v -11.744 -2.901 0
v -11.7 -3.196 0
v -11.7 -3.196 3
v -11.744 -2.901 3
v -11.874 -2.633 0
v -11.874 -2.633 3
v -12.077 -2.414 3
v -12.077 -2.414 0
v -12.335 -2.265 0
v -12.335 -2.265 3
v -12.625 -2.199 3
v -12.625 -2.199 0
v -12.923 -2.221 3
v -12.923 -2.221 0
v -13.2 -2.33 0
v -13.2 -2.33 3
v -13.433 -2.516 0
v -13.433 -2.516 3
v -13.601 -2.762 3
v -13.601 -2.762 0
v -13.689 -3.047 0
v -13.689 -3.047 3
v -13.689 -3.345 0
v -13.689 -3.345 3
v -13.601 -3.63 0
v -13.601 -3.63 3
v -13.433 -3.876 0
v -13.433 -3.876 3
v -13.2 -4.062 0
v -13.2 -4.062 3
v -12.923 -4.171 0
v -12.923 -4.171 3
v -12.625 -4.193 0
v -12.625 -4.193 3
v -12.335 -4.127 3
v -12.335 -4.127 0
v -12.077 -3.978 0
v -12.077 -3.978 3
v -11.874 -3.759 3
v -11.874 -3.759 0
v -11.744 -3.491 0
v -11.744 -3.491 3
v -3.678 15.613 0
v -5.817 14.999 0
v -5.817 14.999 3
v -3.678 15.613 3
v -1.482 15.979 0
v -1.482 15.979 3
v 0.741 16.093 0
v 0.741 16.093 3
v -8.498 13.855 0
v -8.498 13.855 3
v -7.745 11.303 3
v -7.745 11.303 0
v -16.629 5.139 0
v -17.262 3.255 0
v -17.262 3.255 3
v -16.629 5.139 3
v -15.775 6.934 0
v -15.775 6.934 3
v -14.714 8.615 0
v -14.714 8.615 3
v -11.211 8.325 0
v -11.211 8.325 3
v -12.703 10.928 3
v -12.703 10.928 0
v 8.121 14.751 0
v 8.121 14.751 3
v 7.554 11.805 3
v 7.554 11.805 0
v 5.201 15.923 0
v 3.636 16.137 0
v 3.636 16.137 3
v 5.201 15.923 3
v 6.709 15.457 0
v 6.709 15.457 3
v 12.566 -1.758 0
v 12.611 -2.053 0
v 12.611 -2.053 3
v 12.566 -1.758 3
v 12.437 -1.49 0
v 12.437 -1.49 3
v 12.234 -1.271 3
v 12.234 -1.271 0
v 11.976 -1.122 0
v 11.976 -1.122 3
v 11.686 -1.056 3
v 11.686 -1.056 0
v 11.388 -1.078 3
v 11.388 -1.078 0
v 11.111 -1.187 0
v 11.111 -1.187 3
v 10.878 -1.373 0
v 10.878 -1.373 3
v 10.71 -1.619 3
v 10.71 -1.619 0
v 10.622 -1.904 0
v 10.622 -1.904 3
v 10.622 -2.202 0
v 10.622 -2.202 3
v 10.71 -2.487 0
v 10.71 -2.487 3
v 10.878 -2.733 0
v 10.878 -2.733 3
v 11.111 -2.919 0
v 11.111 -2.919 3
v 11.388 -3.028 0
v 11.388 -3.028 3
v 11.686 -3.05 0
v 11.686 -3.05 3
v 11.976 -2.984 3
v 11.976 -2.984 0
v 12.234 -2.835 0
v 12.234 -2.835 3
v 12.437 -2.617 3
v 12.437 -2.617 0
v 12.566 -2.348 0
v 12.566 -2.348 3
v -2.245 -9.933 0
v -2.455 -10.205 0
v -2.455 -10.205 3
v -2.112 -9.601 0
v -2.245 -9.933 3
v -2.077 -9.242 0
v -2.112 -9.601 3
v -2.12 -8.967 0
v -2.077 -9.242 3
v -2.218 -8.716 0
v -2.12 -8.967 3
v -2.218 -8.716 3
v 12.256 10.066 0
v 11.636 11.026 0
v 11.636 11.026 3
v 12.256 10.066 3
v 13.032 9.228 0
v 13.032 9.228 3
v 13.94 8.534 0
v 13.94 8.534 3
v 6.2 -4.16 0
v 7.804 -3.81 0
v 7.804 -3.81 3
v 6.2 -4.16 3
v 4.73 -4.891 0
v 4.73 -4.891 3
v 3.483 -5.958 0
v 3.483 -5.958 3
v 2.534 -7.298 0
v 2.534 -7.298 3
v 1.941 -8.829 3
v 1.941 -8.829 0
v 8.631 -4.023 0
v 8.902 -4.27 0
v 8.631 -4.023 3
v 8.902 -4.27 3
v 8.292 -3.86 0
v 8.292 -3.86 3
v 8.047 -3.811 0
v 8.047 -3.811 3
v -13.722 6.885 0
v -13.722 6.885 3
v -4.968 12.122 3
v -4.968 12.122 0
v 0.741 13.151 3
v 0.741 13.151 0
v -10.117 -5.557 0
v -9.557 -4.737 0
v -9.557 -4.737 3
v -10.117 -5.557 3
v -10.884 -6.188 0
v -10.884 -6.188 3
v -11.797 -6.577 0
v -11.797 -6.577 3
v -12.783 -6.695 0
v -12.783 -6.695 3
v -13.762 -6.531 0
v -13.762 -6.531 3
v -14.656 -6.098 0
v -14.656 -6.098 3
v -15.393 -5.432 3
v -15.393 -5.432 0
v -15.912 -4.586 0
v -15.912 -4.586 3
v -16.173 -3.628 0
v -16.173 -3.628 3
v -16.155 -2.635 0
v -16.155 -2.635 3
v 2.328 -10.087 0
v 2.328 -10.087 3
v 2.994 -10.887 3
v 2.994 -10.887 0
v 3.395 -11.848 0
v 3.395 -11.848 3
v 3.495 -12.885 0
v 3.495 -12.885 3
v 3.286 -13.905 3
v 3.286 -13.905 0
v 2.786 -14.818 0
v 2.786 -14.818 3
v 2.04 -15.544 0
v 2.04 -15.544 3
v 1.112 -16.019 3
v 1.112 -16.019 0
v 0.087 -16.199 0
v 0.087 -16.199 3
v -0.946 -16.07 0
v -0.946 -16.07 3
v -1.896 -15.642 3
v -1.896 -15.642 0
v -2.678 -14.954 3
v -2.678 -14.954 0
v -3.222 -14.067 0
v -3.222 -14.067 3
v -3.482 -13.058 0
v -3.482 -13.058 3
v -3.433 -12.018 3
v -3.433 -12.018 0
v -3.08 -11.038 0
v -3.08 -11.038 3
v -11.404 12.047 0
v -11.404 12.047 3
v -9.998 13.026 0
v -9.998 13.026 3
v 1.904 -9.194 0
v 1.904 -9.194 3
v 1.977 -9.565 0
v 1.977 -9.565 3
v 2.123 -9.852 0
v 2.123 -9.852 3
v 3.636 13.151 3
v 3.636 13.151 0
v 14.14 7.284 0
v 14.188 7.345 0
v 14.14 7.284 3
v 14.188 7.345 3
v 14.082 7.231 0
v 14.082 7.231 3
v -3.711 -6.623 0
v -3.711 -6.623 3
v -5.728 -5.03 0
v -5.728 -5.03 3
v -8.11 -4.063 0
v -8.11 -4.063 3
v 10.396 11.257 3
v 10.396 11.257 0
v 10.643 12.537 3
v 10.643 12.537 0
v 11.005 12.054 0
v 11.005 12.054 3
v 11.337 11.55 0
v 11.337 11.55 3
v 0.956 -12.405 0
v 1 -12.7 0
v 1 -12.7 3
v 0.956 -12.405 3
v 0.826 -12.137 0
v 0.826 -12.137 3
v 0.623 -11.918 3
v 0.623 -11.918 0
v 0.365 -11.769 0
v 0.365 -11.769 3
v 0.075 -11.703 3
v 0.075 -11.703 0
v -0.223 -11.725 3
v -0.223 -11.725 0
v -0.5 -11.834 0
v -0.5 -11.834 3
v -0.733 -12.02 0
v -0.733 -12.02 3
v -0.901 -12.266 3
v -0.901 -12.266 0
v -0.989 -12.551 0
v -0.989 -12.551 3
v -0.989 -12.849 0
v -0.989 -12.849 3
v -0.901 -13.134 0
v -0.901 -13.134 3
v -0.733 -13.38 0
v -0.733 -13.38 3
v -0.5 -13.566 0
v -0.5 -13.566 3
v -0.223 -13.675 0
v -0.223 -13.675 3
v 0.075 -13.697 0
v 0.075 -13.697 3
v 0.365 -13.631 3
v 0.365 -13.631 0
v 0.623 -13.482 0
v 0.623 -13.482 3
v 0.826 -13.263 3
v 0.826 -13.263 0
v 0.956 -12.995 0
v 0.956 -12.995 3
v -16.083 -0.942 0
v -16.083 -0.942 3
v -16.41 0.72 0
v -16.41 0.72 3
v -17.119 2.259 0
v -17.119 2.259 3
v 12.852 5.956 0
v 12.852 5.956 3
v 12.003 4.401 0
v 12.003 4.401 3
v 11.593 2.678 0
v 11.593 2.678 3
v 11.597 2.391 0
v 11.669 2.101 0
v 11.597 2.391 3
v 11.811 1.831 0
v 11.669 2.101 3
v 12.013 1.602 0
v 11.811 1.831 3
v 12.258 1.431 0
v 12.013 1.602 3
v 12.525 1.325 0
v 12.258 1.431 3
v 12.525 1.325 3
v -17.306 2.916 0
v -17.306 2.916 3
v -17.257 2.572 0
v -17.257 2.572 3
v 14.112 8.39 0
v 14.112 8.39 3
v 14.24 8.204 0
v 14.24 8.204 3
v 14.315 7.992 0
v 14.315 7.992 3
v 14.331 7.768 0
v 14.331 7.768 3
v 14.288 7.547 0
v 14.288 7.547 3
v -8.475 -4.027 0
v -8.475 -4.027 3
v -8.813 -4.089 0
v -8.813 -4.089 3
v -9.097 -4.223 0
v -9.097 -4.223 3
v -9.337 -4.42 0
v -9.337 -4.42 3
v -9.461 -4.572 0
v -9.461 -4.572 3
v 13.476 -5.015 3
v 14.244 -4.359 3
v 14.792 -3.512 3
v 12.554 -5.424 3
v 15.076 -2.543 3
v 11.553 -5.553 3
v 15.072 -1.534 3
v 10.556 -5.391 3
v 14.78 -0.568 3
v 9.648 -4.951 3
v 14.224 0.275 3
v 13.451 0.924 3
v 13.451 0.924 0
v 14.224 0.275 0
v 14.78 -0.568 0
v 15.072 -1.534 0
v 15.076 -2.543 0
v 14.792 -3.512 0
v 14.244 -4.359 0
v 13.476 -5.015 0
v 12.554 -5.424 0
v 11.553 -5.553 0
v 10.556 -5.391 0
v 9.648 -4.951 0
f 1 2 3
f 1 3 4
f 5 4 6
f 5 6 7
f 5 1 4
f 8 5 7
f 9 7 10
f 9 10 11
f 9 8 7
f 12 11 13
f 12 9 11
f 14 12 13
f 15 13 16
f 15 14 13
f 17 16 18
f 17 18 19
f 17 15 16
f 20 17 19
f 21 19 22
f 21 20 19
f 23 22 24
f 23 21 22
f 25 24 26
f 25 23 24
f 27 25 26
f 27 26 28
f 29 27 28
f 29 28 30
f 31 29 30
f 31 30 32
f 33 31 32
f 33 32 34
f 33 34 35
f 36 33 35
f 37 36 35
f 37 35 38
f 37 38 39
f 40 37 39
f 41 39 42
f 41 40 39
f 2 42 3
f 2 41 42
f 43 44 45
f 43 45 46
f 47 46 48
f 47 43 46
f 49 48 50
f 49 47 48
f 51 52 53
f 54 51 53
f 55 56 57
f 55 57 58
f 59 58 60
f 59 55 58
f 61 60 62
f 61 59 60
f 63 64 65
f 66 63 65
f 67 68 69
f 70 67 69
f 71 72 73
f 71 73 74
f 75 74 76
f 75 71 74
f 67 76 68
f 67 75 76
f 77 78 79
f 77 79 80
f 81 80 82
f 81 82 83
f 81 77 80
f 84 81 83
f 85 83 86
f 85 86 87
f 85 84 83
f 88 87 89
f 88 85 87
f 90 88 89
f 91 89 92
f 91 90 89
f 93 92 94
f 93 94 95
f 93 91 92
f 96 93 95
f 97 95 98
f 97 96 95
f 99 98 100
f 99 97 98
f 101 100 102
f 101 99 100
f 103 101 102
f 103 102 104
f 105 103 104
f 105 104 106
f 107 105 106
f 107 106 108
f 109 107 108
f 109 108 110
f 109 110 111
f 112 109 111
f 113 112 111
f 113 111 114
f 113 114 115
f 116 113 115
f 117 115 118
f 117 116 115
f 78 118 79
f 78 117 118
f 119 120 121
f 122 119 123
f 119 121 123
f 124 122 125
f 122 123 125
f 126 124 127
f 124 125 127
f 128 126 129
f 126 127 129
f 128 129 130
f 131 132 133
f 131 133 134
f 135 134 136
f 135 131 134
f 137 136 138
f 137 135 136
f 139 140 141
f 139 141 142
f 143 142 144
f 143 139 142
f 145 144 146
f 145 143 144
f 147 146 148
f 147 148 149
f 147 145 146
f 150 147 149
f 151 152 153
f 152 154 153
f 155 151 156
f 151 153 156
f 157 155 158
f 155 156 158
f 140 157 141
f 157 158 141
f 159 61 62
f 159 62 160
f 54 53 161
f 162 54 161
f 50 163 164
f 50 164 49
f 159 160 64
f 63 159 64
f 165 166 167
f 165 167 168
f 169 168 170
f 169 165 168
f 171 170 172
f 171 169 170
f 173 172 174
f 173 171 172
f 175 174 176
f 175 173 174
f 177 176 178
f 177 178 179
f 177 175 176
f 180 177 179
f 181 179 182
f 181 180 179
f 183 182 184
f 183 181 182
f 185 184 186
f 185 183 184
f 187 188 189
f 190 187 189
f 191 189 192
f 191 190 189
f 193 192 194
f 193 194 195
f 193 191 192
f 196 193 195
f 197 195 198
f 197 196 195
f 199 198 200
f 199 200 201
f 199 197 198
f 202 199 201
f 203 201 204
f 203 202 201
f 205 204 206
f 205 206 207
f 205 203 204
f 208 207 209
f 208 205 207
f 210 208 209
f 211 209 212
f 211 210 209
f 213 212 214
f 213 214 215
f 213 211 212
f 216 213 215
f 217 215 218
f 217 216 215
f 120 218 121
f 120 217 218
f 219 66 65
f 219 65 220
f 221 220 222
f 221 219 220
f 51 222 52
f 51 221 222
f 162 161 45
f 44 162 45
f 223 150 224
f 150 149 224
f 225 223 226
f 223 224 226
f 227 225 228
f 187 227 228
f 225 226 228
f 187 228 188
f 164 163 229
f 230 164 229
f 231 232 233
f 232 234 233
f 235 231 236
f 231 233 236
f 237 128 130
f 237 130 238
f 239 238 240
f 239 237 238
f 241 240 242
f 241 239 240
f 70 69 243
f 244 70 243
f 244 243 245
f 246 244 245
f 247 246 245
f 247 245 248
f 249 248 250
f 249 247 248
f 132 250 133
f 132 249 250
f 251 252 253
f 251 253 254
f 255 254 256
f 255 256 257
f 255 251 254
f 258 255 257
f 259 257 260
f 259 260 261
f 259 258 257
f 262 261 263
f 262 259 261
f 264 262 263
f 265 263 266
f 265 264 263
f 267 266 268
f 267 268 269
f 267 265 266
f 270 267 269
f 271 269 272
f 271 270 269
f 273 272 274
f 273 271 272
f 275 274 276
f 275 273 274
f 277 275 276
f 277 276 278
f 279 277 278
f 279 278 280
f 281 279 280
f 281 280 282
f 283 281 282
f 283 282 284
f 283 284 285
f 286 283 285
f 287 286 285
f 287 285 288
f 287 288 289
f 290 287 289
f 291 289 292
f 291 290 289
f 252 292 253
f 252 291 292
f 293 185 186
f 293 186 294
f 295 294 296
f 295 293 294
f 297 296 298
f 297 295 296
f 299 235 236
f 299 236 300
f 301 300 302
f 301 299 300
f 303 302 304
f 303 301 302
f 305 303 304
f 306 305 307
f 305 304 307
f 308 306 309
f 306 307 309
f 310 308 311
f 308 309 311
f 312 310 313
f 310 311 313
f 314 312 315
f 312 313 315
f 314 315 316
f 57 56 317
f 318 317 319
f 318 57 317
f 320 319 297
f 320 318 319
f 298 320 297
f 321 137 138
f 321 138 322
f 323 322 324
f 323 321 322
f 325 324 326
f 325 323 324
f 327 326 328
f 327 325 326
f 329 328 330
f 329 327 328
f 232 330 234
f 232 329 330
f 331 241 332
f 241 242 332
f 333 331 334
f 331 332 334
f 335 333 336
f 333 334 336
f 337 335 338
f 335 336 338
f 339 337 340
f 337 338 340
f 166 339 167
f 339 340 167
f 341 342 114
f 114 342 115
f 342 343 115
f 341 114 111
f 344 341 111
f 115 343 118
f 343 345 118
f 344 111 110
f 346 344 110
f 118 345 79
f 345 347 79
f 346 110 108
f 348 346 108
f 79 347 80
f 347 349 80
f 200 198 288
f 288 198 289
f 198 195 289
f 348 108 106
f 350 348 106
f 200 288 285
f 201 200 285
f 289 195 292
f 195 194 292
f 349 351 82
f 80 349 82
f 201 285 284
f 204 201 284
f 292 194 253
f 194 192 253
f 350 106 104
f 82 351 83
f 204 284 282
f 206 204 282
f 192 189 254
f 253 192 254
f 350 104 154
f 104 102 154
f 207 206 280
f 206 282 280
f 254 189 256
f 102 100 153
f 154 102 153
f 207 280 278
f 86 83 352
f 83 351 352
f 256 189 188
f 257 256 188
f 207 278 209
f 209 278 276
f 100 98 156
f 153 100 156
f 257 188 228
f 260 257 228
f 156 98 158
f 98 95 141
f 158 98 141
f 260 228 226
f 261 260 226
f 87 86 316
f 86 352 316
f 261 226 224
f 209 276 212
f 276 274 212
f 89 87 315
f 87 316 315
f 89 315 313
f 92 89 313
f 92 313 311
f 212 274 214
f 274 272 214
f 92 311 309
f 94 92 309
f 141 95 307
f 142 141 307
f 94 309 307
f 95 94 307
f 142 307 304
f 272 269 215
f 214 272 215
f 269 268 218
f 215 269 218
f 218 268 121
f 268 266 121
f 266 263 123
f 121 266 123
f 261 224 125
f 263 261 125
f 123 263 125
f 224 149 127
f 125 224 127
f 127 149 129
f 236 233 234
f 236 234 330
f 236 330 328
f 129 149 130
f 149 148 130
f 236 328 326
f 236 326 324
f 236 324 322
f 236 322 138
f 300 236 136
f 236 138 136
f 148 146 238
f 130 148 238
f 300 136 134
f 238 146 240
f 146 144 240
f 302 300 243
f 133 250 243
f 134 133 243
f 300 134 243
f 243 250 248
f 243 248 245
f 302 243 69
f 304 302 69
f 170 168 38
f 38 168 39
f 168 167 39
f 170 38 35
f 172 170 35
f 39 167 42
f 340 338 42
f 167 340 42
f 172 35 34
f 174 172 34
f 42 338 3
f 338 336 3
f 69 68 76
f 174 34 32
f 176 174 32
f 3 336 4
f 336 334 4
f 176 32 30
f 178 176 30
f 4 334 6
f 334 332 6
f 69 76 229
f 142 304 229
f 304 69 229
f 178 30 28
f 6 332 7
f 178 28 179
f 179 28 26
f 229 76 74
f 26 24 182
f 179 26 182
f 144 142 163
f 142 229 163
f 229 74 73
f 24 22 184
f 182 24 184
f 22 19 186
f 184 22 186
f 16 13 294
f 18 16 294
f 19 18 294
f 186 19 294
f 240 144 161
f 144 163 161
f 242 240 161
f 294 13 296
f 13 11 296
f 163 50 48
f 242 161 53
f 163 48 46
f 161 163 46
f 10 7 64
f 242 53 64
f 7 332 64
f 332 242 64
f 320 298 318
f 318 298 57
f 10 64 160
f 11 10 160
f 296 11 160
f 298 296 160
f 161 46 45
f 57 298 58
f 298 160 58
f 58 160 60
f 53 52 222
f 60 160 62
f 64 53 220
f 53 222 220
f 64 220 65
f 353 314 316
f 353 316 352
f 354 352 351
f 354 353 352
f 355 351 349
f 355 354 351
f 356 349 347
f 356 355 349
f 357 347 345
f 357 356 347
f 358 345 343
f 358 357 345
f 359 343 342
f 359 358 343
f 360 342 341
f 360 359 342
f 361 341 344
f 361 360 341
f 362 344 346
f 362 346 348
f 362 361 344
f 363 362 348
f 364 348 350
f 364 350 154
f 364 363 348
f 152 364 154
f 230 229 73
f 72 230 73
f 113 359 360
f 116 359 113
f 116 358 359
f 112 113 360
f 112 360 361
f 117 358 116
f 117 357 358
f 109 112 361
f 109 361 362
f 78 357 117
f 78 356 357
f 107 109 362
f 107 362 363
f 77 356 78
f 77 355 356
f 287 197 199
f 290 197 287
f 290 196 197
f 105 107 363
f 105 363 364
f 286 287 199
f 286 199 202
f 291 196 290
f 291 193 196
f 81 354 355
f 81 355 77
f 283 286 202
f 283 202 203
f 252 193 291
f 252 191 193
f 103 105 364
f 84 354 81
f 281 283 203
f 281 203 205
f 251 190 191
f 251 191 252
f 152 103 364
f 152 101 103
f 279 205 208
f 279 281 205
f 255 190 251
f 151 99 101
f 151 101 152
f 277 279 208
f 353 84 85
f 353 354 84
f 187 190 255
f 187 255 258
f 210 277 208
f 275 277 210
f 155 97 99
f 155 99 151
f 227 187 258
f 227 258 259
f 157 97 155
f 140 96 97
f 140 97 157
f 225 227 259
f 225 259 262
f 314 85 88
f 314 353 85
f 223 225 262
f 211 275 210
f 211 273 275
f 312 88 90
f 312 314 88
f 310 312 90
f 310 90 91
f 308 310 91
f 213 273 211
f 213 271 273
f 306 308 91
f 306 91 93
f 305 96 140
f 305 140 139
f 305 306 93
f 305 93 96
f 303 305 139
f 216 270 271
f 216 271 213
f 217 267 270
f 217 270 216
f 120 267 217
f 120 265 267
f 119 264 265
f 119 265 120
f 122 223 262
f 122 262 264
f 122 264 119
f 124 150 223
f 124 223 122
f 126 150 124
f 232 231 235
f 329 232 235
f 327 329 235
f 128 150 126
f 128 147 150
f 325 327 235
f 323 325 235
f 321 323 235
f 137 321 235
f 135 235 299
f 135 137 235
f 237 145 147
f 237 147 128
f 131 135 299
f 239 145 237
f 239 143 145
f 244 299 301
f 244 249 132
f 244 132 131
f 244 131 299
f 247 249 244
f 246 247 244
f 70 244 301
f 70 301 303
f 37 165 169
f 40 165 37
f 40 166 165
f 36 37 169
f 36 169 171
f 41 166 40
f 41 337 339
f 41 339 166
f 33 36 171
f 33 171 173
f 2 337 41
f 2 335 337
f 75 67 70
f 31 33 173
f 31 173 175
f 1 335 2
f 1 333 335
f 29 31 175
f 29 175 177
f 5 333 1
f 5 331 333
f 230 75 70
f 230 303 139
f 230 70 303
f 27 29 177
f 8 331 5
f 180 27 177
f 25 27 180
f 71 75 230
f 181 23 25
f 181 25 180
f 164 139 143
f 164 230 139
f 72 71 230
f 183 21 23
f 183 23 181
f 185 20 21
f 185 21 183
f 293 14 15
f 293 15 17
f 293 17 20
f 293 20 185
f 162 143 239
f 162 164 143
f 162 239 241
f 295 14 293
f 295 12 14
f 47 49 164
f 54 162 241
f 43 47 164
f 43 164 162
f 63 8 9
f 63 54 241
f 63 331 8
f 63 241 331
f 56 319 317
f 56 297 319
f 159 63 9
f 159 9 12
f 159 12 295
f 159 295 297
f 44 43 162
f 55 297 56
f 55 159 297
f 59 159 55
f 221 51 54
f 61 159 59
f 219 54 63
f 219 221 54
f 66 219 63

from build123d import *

# Parameters (mm, degrees)
SKETCH_1_R          = 1
EXTRUDE_1_DEPTH     = 3
FILLET_2_R          = 0.508
FILLET_3_R          = 1.27
SKETCH_3_W          = 2.895
SKETCH_3_H          = 3
CUT_EXTRUDE_1_DEPTH = 3


with BuildPart() as part:
    # 스케치1 → 보스-돌출1 (new body)
    with BuildSketch(Plane.XY):
        with BuildLine():
            ThreePointArc((-17.404694621, 2.689152768), (-14.003146094, 9.533383958), (-7.898975086, 14.132637079))
            ThreePointArc((-7.898975086, 14.132637079), (-3.181334345, 15.718511975), (1.784123639, 16.058159386))
            ThreePointArc((1.784123639, 16.058159386), (7.503730287, 15.09544823), (11.636286652, 11.025719632))
            ThreePointArc((11.636286652, 11.025719632), (12.626023912, 9.630255586), (13.939804575, 8.534408829))
            ThreePointArc((13.939804575, 8.534408829), (14.323714016, 7.94412001), (14.129144933, 7.267385039))
            ThreePointArc((14.129144933, 7.267385039), (12.117054941, 4.680354007), (11.583823092, 1.44664105))
            ThreePointArc((11.583823092, 1.44664105), (14.643044666, -3.801243579), (8.56860409, -3.783882772))
            ThreePointArc((8.56860409, -3.783882772), (4.032207962, -5.42180917), (1.784123639, -9.688870172))
            ThreePointArc((1.784123639, -9.688870172), (0, -16.2), (-1.784123639, -9.688870172))
            ThreePointArc((-1.784123639, -9.688870172), (-4.704806794, -5.722399103), (-9.262378909, -3.853758086))
            ThreePointArc((-9.262378909, -3.853758086), (-13.309581542, -6.642419158), (-16.154715264, -2.634714849))
            ThreePointArc((-16.154715264, -2.634714849), (-16.251667385, 0.151195755), (-17.404694621, 2.689152768))
        make_face()
        with Locations((-12.7, -3.195912181)):
            Circle(SKETCH_1_R, mode=Mode.SUBTRACT)
        with Locations((0, -12.7)):
            Circle(SKETCH_1_R, mode=Mode.SUBTRACT)
        with Locations((11.610795337, -2.05325502)):
            Circle(SKETCH_1_R, mode=Mode.SUBTRACT)
    extrude(amount=EXTRUDE_1_DEPTH)

    # 필렛2
    fillet_2_edges = [part.edges().sort_by_distance(p)[0] for p in [
        (14.129144933, 7.267385039, 1.5),
    ]]
    fillet(fillet_2_edges, radius=FILLET_2_R)

    # 필렛3
    fillet_3_edges = [part.edges().sort_by_distance(p)[0] for p in [
        (1.784123639, -9.688870172, 1.5),
        (-1.784123639, -9.688870172, 1.5),
        (-9.262378909, -3.853758086, 1.5),
        (-17.404694621, 2.689152768, 1.5),
        (11.583823092, 1.44664105, 1.5),
        (8.56860409, -3.783882772, 1.5),
    ]]
    fillet(fillet_3_edges, radius=FILLET_3_R)

    # 스케치3 → 컷-돌출1 (cut)
    with BuildSketch(Plane.XY.offset(3)):
        Polygon((-13.722156846, 6.885379209), (-11.210602391, 8.325212263), (-12.702657369, 10.927859366), (-15.214211823, 9.488026313), align=None)
        Polygon((-7.745048824, 11.302508101), (-4.968377523, 12.121728149), (-5.817310215, 14.999107735), (-8.593981516, 14.179887687), align=None)
        with Locations((2.188643344, 14.650807918)):
            Rectangle(SKETCH_3_W, SKETCH_3_H)
        Polygon((7.553748194, 11.804988601), (10.396441684, 11.257157677), (10.964142123, 14.20295404), (8.121448633, 14.750784964), align=None)
    extrude(amount=-CUT_EXTRUDE_1_DEPTH, mode=Mode.SUBTRACT)


solid = part.part
